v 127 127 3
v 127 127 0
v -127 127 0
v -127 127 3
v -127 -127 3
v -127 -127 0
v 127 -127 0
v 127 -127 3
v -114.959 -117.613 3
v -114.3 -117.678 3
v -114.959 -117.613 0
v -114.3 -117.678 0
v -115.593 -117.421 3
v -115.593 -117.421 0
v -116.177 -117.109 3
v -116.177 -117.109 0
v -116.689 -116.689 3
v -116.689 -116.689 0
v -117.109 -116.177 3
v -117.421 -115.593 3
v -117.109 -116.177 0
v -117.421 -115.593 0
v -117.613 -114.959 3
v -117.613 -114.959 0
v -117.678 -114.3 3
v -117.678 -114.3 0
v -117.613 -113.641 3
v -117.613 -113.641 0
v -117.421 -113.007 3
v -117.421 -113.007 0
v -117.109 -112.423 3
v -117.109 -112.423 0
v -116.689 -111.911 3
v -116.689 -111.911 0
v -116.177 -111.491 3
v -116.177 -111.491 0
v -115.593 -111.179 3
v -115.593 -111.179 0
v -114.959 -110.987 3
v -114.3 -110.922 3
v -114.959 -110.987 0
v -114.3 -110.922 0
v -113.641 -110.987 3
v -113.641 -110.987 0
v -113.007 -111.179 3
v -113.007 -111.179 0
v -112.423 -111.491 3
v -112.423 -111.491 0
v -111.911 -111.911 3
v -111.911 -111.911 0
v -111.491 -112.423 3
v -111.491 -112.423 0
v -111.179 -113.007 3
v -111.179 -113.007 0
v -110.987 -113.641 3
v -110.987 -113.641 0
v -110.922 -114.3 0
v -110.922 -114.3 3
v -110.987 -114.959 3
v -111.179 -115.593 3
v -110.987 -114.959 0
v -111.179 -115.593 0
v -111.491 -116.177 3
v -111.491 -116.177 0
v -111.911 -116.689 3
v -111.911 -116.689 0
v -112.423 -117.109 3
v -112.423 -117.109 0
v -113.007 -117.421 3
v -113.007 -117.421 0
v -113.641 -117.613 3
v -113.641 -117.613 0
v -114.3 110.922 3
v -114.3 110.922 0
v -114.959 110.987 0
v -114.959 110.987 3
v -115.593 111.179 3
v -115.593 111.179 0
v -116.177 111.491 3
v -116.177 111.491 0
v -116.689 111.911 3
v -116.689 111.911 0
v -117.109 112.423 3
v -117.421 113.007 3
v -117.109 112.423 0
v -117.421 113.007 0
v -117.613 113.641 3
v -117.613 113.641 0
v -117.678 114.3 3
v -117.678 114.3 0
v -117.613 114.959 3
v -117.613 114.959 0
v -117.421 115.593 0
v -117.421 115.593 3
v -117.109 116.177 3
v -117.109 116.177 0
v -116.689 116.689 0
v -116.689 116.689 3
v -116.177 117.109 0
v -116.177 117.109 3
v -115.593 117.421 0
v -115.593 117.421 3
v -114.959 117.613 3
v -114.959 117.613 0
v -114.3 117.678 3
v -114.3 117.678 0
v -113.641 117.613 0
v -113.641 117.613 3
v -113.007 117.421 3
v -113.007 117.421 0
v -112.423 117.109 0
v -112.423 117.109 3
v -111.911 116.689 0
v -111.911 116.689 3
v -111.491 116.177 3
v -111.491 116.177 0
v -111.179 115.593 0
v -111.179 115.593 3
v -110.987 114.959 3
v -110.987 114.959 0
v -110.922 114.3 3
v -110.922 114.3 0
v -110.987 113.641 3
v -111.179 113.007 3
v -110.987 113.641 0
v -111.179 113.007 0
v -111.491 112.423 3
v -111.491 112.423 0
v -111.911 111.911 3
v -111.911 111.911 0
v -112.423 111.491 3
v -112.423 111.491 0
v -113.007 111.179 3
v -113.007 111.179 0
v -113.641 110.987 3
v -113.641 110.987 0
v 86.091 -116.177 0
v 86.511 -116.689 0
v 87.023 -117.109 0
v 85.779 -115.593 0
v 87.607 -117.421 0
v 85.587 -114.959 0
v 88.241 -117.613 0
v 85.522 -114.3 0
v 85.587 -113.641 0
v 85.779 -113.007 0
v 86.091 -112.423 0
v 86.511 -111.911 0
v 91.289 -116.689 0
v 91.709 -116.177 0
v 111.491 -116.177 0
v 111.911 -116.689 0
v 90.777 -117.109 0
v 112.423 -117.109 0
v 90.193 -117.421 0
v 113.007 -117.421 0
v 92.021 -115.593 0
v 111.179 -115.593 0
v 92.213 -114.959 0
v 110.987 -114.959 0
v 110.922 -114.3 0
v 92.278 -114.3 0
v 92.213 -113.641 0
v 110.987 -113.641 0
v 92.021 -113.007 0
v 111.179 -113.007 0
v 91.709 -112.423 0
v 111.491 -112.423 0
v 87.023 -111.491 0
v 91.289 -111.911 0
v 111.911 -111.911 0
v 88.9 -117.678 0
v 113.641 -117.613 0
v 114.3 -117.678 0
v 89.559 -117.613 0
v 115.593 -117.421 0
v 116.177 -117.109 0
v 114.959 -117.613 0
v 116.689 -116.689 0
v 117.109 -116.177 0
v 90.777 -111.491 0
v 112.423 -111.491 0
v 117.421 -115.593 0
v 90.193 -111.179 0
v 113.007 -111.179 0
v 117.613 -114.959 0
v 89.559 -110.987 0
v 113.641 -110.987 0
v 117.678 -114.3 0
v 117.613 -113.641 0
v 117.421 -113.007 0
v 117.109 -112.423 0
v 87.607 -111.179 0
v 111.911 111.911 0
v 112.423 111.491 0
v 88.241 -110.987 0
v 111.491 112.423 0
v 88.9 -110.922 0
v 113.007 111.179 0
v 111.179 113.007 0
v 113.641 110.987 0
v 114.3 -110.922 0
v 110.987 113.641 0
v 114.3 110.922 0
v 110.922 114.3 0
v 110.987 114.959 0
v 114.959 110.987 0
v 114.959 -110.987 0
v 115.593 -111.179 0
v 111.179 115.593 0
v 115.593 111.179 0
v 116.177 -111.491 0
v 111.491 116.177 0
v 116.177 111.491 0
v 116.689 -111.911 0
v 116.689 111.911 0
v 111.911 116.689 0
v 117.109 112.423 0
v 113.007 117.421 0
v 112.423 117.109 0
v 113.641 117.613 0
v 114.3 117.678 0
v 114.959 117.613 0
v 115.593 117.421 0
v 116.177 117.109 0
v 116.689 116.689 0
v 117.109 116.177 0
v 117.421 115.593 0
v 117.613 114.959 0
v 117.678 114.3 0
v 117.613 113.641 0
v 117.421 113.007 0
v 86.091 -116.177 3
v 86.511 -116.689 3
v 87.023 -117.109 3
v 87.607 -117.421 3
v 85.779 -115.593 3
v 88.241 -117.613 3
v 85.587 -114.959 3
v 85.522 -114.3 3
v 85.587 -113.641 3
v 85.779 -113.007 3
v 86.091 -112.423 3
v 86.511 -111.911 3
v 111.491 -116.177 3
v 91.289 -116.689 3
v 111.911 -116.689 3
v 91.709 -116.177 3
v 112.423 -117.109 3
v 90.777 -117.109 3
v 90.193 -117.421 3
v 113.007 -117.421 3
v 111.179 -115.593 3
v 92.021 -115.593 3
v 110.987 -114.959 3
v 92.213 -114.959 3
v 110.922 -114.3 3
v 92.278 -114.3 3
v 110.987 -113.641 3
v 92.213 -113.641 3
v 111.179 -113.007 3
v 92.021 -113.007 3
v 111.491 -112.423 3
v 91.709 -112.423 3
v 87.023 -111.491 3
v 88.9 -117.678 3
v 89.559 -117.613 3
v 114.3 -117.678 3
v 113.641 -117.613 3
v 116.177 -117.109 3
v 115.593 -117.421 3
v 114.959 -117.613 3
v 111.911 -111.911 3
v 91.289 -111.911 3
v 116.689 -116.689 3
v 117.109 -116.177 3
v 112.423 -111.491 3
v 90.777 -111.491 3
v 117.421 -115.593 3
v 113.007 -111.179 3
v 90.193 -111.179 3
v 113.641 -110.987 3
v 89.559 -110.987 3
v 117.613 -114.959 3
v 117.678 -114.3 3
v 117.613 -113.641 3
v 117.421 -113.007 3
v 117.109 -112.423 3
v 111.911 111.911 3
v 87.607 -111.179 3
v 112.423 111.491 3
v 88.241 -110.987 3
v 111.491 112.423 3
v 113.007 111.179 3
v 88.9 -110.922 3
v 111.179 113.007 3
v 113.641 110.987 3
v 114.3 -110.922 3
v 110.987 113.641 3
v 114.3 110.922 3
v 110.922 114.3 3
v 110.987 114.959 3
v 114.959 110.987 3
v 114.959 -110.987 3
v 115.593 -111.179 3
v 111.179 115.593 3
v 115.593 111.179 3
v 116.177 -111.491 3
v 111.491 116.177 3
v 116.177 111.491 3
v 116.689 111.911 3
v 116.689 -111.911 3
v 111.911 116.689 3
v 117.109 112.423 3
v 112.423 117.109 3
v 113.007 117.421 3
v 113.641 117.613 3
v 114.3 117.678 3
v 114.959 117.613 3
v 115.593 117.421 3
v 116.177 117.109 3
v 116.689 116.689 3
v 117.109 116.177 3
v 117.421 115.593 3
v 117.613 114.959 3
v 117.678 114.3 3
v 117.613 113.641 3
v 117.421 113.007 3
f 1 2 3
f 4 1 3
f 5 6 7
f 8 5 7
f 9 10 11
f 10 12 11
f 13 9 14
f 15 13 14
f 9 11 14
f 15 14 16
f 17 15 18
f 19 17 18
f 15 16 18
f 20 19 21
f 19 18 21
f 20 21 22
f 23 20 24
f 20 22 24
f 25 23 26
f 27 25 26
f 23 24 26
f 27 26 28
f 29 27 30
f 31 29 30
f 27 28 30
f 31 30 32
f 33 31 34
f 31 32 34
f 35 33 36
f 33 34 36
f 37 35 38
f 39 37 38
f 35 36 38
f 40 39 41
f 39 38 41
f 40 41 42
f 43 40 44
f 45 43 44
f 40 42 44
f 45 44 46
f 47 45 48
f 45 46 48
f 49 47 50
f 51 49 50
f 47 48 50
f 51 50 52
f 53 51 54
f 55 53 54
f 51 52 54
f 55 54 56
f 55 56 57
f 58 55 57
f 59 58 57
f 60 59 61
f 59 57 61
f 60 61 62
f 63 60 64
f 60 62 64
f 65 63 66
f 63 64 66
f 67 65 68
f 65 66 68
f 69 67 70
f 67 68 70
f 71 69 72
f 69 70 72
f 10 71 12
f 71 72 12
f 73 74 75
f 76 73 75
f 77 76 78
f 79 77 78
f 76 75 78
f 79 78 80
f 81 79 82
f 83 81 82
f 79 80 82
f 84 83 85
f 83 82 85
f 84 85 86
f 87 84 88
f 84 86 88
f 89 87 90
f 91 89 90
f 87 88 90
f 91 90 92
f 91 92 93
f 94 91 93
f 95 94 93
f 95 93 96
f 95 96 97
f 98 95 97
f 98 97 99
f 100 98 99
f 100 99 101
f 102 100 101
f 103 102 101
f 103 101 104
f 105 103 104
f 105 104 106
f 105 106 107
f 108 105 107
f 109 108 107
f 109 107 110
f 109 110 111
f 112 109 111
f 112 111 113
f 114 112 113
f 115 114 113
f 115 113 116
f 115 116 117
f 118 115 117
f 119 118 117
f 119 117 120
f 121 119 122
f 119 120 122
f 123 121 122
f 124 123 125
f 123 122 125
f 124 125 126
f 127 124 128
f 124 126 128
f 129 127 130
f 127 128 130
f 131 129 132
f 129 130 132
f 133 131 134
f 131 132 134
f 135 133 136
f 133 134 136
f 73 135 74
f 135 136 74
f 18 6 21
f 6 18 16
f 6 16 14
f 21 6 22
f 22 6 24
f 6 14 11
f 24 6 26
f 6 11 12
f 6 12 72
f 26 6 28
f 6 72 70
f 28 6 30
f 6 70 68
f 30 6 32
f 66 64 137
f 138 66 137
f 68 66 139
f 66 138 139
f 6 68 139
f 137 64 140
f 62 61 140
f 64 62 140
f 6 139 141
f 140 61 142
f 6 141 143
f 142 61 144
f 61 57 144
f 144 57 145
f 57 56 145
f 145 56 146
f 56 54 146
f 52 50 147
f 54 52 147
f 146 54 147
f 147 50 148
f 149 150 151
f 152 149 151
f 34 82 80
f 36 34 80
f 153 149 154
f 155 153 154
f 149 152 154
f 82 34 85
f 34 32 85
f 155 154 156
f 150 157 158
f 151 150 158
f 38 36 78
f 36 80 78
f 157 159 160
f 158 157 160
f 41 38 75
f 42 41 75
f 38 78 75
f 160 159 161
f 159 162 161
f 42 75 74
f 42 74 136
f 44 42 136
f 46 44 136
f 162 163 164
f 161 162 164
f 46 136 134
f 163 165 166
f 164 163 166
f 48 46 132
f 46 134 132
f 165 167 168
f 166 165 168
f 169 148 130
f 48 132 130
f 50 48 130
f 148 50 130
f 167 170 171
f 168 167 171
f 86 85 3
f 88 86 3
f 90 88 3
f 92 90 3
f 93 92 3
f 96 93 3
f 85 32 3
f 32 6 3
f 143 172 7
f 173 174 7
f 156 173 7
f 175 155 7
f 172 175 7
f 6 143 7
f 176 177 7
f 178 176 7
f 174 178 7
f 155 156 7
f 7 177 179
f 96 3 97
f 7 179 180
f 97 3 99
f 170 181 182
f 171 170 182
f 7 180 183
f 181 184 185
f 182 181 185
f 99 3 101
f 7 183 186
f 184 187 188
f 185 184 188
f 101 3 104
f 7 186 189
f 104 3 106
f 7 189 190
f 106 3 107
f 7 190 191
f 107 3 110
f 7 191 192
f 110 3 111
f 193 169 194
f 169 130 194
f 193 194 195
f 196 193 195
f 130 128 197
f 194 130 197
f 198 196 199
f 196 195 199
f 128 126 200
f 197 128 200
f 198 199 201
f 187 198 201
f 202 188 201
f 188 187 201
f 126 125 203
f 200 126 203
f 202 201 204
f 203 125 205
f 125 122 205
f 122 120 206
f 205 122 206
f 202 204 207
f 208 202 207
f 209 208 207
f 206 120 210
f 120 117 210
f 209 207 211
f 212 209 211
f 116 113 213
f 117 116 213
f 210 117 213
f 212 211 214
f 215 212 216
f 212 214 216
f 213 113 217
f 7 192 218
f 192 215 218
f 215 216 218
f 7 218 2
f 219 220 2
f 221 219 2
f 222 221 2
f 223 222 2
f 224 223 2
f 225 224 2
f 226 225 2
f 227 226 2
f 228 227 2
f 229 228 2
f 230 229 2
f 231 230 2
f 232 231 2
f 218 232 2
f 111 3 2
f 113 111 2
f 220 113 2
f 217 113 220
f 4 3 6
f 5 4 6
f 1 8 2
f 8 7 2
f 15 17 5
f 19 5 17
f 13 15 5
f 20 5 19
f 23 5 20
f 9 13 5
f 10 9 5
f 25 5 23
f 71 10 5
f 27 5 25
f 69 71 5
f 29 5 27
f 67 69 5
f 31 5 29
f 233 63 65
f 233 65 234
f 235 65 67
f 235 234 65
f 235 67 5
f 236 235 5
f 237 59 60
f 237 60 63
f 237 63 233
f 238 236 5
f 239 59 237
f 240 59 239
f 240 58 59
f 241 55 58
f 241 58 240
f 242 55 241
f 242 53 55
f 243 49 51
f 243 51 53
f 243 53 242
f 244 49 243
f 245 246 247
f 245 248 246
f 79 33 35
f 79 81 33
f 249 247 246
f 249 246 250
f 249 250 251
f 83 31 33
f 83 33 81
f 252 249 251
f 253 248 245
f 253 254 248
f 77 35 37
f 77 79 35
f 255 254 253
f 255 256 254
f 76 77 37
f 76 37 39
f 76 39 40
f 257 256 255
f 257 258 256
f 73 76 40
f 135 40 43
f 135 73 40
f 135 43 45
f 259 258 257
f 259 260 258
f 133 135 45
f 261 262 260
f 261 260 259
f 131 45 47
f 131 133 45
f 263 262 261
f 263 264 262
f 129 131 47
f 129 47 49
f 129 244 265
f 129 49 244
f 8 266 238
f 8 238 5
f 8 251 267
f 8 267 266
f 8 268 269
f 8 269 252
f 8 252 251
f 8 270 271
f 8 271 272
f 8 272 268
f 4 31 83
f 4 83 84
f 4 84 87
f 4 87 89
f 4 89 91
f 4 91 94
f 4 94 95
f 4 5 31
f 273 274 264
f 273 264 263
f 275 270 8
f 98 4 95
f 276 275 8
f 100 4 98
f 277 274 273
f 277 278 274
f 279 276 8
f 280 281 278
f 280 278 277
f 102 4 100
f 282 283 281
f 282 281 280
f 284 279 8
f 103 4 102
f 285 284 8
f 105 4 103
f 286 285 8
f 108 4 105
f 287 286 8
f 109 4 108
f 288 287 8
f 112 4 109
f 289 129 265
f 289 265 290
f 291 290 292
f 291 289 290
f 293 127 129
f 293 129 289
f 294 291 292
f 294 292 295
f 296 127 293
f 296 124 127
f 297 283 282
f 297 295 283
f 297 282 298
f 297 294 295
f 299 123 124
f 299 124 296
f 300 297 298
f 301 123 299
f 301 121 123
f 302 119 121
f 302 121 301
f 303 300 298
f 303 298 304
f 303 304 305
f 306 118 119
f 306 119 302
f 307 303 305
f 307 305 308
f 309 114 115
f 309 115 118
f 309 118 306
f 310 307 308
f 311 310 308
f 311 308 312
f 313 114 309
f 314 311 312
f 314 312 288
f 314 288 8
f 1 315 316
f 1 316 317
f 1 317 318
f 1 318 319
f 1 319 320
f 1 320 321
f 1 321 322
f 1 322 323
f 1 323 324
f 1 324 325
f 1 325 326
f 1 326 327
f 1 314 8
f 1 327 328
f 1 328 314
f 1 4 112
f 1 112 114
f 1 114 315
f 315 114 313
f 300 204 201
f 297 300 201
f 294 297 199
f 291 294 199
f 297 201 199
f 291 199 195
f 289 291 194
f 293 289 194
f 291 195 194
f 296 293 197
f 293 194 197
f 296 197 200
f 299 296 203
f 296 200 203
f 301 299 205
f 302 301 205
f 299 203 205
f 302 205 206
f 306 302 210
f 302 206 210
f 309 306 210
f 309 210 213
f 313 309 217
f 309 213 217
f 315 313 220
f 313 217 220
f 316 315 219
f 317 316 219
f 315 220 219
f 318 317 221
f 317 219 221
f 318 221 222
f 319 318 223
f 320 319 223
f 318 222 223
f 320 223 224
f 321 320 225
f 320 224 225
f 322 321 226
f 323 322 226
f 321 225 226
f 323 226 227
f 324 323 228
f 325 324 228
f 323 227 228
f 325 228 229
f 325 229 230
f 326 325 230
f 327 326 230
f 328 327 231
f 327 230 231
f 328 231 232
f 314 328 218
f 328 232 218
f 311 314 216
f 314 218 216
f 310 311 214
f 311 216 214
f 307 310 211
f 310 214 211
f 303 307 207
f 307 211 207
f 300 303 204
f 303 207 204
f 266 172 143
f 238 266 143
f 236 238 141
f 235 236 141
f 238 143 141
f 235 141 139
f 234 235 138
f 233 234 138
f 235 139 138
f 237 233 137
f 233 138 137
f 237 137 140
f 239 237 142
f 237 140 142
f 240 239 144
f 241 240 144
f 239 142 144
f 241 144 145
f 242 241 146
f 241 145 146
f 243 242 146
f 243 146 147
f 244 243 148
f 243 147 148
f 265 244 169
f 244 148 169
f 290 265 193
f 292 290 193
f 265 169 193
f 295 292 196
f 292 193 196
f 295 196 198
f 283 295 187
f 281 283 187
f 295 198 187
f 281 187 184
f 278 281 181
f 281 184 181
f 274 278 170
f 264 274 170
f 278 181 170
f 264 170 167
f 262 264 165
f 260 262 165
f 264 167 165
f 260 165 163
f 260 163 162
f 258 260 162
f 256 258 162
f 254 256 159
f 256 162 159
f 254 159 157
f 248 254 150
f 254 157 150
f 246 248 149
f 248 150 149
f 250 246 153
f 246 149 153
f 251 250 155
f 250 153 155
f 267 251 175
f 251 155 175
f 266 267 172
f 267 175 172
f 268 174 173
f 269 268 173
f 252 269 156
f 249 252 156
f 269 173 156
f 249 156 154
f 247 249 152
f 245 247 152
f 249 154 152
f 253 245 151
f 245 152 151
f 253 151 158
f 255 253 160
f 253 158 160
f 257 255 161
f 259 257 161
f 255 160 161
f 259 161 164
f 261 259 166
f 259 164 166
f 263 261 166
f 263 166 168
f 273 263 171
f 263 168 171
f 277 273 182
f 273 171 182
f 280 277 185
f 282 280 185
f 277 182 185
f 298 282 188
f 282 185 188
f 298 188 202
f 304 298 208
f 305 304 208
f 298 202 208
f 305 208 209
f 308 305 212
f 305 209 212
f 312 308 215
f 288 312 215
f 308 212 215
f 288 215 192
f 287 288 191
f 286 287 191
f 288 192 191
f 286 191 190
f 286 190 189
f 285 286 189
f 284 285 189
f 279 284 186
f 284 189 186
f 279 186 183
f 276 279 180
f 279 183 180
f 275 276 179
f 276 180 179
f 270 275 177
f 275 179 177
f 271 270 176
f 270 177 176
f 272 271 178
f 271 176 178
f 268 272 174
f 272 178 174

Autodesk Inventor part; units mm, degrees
ref_plane "YZ Plane" through (0, 0, 0) normal (1, 0, 0) x (0, 1, 0)
ref_plane "XZ Plane" through (0, 0, 0) normal (0, 1, 0) x (-1, 0, 0)
ref_plane "XY Plane" through (0, 0, 0) normal (0, 0, 1) x (1, 0, 0)
sketch "Sketch1" plane through (0, 0, 0) normal (0, 0, 1) x (1, 0, 0)
  line L0 (-127, -127) -> (127, -127)
  line L1 (127, -127) -> (127, 127)
  line L2 (127, 127) -> (-127, 127)
  line L3 (-127, 127) -> (-127, -127)
  line L4 (-127, -127) -> (127, 127) construction
  point P0 (0, 0)
  point P1 (0, 0)
  dimension "d0" = 254
  dimension "d1" = 254
extrude "Extrusion1" add sketch "Sketch1" along normal blind 3
sketch "Sketch2" plane through (0, 0, 3) normal (0, 0, 1) x (1, 0, 0)
  line L0 (-114.3, -114.3) -> (114.3, -114.3) construction
  line L1 (114.3, -114.3) -> (114.3, 114.3) construction
  line L2 (114.3, 114.3) -> (-114.3, 114.3) construction
  line L3 (-114.3, 114.3) -> (-114.3, -114.3) construction
  line L4 (-114.3, -114.3) -> (114.3, 114.3) construction
  point P0 (0, 0)
  point P1 (0, 0)
  point P2 (88.9, -114.3)
  dimension "d4" = 228.6
  dimension "d5" = 228.6
hole "Hole1" at (-114.3, 114.3, 3) at (114.3, 114.3, 3) at (114.3, -114.3, 3) at (-114.3, -114.3, 3) direction (0, 0, -1) diameter 6.7564 end through all
sketch "Sketch3" plane through (0, 0, 3) normal (0, 0, 1) x (1, 0, 0)
  point P0 (0, 0)
  point P1 (88.9, -114.3)
hole "Hole2" at (88.9, -114.3, 3) direction (0, 0, -1) diameter 6.7564 depth 25.4 tip angle 118
